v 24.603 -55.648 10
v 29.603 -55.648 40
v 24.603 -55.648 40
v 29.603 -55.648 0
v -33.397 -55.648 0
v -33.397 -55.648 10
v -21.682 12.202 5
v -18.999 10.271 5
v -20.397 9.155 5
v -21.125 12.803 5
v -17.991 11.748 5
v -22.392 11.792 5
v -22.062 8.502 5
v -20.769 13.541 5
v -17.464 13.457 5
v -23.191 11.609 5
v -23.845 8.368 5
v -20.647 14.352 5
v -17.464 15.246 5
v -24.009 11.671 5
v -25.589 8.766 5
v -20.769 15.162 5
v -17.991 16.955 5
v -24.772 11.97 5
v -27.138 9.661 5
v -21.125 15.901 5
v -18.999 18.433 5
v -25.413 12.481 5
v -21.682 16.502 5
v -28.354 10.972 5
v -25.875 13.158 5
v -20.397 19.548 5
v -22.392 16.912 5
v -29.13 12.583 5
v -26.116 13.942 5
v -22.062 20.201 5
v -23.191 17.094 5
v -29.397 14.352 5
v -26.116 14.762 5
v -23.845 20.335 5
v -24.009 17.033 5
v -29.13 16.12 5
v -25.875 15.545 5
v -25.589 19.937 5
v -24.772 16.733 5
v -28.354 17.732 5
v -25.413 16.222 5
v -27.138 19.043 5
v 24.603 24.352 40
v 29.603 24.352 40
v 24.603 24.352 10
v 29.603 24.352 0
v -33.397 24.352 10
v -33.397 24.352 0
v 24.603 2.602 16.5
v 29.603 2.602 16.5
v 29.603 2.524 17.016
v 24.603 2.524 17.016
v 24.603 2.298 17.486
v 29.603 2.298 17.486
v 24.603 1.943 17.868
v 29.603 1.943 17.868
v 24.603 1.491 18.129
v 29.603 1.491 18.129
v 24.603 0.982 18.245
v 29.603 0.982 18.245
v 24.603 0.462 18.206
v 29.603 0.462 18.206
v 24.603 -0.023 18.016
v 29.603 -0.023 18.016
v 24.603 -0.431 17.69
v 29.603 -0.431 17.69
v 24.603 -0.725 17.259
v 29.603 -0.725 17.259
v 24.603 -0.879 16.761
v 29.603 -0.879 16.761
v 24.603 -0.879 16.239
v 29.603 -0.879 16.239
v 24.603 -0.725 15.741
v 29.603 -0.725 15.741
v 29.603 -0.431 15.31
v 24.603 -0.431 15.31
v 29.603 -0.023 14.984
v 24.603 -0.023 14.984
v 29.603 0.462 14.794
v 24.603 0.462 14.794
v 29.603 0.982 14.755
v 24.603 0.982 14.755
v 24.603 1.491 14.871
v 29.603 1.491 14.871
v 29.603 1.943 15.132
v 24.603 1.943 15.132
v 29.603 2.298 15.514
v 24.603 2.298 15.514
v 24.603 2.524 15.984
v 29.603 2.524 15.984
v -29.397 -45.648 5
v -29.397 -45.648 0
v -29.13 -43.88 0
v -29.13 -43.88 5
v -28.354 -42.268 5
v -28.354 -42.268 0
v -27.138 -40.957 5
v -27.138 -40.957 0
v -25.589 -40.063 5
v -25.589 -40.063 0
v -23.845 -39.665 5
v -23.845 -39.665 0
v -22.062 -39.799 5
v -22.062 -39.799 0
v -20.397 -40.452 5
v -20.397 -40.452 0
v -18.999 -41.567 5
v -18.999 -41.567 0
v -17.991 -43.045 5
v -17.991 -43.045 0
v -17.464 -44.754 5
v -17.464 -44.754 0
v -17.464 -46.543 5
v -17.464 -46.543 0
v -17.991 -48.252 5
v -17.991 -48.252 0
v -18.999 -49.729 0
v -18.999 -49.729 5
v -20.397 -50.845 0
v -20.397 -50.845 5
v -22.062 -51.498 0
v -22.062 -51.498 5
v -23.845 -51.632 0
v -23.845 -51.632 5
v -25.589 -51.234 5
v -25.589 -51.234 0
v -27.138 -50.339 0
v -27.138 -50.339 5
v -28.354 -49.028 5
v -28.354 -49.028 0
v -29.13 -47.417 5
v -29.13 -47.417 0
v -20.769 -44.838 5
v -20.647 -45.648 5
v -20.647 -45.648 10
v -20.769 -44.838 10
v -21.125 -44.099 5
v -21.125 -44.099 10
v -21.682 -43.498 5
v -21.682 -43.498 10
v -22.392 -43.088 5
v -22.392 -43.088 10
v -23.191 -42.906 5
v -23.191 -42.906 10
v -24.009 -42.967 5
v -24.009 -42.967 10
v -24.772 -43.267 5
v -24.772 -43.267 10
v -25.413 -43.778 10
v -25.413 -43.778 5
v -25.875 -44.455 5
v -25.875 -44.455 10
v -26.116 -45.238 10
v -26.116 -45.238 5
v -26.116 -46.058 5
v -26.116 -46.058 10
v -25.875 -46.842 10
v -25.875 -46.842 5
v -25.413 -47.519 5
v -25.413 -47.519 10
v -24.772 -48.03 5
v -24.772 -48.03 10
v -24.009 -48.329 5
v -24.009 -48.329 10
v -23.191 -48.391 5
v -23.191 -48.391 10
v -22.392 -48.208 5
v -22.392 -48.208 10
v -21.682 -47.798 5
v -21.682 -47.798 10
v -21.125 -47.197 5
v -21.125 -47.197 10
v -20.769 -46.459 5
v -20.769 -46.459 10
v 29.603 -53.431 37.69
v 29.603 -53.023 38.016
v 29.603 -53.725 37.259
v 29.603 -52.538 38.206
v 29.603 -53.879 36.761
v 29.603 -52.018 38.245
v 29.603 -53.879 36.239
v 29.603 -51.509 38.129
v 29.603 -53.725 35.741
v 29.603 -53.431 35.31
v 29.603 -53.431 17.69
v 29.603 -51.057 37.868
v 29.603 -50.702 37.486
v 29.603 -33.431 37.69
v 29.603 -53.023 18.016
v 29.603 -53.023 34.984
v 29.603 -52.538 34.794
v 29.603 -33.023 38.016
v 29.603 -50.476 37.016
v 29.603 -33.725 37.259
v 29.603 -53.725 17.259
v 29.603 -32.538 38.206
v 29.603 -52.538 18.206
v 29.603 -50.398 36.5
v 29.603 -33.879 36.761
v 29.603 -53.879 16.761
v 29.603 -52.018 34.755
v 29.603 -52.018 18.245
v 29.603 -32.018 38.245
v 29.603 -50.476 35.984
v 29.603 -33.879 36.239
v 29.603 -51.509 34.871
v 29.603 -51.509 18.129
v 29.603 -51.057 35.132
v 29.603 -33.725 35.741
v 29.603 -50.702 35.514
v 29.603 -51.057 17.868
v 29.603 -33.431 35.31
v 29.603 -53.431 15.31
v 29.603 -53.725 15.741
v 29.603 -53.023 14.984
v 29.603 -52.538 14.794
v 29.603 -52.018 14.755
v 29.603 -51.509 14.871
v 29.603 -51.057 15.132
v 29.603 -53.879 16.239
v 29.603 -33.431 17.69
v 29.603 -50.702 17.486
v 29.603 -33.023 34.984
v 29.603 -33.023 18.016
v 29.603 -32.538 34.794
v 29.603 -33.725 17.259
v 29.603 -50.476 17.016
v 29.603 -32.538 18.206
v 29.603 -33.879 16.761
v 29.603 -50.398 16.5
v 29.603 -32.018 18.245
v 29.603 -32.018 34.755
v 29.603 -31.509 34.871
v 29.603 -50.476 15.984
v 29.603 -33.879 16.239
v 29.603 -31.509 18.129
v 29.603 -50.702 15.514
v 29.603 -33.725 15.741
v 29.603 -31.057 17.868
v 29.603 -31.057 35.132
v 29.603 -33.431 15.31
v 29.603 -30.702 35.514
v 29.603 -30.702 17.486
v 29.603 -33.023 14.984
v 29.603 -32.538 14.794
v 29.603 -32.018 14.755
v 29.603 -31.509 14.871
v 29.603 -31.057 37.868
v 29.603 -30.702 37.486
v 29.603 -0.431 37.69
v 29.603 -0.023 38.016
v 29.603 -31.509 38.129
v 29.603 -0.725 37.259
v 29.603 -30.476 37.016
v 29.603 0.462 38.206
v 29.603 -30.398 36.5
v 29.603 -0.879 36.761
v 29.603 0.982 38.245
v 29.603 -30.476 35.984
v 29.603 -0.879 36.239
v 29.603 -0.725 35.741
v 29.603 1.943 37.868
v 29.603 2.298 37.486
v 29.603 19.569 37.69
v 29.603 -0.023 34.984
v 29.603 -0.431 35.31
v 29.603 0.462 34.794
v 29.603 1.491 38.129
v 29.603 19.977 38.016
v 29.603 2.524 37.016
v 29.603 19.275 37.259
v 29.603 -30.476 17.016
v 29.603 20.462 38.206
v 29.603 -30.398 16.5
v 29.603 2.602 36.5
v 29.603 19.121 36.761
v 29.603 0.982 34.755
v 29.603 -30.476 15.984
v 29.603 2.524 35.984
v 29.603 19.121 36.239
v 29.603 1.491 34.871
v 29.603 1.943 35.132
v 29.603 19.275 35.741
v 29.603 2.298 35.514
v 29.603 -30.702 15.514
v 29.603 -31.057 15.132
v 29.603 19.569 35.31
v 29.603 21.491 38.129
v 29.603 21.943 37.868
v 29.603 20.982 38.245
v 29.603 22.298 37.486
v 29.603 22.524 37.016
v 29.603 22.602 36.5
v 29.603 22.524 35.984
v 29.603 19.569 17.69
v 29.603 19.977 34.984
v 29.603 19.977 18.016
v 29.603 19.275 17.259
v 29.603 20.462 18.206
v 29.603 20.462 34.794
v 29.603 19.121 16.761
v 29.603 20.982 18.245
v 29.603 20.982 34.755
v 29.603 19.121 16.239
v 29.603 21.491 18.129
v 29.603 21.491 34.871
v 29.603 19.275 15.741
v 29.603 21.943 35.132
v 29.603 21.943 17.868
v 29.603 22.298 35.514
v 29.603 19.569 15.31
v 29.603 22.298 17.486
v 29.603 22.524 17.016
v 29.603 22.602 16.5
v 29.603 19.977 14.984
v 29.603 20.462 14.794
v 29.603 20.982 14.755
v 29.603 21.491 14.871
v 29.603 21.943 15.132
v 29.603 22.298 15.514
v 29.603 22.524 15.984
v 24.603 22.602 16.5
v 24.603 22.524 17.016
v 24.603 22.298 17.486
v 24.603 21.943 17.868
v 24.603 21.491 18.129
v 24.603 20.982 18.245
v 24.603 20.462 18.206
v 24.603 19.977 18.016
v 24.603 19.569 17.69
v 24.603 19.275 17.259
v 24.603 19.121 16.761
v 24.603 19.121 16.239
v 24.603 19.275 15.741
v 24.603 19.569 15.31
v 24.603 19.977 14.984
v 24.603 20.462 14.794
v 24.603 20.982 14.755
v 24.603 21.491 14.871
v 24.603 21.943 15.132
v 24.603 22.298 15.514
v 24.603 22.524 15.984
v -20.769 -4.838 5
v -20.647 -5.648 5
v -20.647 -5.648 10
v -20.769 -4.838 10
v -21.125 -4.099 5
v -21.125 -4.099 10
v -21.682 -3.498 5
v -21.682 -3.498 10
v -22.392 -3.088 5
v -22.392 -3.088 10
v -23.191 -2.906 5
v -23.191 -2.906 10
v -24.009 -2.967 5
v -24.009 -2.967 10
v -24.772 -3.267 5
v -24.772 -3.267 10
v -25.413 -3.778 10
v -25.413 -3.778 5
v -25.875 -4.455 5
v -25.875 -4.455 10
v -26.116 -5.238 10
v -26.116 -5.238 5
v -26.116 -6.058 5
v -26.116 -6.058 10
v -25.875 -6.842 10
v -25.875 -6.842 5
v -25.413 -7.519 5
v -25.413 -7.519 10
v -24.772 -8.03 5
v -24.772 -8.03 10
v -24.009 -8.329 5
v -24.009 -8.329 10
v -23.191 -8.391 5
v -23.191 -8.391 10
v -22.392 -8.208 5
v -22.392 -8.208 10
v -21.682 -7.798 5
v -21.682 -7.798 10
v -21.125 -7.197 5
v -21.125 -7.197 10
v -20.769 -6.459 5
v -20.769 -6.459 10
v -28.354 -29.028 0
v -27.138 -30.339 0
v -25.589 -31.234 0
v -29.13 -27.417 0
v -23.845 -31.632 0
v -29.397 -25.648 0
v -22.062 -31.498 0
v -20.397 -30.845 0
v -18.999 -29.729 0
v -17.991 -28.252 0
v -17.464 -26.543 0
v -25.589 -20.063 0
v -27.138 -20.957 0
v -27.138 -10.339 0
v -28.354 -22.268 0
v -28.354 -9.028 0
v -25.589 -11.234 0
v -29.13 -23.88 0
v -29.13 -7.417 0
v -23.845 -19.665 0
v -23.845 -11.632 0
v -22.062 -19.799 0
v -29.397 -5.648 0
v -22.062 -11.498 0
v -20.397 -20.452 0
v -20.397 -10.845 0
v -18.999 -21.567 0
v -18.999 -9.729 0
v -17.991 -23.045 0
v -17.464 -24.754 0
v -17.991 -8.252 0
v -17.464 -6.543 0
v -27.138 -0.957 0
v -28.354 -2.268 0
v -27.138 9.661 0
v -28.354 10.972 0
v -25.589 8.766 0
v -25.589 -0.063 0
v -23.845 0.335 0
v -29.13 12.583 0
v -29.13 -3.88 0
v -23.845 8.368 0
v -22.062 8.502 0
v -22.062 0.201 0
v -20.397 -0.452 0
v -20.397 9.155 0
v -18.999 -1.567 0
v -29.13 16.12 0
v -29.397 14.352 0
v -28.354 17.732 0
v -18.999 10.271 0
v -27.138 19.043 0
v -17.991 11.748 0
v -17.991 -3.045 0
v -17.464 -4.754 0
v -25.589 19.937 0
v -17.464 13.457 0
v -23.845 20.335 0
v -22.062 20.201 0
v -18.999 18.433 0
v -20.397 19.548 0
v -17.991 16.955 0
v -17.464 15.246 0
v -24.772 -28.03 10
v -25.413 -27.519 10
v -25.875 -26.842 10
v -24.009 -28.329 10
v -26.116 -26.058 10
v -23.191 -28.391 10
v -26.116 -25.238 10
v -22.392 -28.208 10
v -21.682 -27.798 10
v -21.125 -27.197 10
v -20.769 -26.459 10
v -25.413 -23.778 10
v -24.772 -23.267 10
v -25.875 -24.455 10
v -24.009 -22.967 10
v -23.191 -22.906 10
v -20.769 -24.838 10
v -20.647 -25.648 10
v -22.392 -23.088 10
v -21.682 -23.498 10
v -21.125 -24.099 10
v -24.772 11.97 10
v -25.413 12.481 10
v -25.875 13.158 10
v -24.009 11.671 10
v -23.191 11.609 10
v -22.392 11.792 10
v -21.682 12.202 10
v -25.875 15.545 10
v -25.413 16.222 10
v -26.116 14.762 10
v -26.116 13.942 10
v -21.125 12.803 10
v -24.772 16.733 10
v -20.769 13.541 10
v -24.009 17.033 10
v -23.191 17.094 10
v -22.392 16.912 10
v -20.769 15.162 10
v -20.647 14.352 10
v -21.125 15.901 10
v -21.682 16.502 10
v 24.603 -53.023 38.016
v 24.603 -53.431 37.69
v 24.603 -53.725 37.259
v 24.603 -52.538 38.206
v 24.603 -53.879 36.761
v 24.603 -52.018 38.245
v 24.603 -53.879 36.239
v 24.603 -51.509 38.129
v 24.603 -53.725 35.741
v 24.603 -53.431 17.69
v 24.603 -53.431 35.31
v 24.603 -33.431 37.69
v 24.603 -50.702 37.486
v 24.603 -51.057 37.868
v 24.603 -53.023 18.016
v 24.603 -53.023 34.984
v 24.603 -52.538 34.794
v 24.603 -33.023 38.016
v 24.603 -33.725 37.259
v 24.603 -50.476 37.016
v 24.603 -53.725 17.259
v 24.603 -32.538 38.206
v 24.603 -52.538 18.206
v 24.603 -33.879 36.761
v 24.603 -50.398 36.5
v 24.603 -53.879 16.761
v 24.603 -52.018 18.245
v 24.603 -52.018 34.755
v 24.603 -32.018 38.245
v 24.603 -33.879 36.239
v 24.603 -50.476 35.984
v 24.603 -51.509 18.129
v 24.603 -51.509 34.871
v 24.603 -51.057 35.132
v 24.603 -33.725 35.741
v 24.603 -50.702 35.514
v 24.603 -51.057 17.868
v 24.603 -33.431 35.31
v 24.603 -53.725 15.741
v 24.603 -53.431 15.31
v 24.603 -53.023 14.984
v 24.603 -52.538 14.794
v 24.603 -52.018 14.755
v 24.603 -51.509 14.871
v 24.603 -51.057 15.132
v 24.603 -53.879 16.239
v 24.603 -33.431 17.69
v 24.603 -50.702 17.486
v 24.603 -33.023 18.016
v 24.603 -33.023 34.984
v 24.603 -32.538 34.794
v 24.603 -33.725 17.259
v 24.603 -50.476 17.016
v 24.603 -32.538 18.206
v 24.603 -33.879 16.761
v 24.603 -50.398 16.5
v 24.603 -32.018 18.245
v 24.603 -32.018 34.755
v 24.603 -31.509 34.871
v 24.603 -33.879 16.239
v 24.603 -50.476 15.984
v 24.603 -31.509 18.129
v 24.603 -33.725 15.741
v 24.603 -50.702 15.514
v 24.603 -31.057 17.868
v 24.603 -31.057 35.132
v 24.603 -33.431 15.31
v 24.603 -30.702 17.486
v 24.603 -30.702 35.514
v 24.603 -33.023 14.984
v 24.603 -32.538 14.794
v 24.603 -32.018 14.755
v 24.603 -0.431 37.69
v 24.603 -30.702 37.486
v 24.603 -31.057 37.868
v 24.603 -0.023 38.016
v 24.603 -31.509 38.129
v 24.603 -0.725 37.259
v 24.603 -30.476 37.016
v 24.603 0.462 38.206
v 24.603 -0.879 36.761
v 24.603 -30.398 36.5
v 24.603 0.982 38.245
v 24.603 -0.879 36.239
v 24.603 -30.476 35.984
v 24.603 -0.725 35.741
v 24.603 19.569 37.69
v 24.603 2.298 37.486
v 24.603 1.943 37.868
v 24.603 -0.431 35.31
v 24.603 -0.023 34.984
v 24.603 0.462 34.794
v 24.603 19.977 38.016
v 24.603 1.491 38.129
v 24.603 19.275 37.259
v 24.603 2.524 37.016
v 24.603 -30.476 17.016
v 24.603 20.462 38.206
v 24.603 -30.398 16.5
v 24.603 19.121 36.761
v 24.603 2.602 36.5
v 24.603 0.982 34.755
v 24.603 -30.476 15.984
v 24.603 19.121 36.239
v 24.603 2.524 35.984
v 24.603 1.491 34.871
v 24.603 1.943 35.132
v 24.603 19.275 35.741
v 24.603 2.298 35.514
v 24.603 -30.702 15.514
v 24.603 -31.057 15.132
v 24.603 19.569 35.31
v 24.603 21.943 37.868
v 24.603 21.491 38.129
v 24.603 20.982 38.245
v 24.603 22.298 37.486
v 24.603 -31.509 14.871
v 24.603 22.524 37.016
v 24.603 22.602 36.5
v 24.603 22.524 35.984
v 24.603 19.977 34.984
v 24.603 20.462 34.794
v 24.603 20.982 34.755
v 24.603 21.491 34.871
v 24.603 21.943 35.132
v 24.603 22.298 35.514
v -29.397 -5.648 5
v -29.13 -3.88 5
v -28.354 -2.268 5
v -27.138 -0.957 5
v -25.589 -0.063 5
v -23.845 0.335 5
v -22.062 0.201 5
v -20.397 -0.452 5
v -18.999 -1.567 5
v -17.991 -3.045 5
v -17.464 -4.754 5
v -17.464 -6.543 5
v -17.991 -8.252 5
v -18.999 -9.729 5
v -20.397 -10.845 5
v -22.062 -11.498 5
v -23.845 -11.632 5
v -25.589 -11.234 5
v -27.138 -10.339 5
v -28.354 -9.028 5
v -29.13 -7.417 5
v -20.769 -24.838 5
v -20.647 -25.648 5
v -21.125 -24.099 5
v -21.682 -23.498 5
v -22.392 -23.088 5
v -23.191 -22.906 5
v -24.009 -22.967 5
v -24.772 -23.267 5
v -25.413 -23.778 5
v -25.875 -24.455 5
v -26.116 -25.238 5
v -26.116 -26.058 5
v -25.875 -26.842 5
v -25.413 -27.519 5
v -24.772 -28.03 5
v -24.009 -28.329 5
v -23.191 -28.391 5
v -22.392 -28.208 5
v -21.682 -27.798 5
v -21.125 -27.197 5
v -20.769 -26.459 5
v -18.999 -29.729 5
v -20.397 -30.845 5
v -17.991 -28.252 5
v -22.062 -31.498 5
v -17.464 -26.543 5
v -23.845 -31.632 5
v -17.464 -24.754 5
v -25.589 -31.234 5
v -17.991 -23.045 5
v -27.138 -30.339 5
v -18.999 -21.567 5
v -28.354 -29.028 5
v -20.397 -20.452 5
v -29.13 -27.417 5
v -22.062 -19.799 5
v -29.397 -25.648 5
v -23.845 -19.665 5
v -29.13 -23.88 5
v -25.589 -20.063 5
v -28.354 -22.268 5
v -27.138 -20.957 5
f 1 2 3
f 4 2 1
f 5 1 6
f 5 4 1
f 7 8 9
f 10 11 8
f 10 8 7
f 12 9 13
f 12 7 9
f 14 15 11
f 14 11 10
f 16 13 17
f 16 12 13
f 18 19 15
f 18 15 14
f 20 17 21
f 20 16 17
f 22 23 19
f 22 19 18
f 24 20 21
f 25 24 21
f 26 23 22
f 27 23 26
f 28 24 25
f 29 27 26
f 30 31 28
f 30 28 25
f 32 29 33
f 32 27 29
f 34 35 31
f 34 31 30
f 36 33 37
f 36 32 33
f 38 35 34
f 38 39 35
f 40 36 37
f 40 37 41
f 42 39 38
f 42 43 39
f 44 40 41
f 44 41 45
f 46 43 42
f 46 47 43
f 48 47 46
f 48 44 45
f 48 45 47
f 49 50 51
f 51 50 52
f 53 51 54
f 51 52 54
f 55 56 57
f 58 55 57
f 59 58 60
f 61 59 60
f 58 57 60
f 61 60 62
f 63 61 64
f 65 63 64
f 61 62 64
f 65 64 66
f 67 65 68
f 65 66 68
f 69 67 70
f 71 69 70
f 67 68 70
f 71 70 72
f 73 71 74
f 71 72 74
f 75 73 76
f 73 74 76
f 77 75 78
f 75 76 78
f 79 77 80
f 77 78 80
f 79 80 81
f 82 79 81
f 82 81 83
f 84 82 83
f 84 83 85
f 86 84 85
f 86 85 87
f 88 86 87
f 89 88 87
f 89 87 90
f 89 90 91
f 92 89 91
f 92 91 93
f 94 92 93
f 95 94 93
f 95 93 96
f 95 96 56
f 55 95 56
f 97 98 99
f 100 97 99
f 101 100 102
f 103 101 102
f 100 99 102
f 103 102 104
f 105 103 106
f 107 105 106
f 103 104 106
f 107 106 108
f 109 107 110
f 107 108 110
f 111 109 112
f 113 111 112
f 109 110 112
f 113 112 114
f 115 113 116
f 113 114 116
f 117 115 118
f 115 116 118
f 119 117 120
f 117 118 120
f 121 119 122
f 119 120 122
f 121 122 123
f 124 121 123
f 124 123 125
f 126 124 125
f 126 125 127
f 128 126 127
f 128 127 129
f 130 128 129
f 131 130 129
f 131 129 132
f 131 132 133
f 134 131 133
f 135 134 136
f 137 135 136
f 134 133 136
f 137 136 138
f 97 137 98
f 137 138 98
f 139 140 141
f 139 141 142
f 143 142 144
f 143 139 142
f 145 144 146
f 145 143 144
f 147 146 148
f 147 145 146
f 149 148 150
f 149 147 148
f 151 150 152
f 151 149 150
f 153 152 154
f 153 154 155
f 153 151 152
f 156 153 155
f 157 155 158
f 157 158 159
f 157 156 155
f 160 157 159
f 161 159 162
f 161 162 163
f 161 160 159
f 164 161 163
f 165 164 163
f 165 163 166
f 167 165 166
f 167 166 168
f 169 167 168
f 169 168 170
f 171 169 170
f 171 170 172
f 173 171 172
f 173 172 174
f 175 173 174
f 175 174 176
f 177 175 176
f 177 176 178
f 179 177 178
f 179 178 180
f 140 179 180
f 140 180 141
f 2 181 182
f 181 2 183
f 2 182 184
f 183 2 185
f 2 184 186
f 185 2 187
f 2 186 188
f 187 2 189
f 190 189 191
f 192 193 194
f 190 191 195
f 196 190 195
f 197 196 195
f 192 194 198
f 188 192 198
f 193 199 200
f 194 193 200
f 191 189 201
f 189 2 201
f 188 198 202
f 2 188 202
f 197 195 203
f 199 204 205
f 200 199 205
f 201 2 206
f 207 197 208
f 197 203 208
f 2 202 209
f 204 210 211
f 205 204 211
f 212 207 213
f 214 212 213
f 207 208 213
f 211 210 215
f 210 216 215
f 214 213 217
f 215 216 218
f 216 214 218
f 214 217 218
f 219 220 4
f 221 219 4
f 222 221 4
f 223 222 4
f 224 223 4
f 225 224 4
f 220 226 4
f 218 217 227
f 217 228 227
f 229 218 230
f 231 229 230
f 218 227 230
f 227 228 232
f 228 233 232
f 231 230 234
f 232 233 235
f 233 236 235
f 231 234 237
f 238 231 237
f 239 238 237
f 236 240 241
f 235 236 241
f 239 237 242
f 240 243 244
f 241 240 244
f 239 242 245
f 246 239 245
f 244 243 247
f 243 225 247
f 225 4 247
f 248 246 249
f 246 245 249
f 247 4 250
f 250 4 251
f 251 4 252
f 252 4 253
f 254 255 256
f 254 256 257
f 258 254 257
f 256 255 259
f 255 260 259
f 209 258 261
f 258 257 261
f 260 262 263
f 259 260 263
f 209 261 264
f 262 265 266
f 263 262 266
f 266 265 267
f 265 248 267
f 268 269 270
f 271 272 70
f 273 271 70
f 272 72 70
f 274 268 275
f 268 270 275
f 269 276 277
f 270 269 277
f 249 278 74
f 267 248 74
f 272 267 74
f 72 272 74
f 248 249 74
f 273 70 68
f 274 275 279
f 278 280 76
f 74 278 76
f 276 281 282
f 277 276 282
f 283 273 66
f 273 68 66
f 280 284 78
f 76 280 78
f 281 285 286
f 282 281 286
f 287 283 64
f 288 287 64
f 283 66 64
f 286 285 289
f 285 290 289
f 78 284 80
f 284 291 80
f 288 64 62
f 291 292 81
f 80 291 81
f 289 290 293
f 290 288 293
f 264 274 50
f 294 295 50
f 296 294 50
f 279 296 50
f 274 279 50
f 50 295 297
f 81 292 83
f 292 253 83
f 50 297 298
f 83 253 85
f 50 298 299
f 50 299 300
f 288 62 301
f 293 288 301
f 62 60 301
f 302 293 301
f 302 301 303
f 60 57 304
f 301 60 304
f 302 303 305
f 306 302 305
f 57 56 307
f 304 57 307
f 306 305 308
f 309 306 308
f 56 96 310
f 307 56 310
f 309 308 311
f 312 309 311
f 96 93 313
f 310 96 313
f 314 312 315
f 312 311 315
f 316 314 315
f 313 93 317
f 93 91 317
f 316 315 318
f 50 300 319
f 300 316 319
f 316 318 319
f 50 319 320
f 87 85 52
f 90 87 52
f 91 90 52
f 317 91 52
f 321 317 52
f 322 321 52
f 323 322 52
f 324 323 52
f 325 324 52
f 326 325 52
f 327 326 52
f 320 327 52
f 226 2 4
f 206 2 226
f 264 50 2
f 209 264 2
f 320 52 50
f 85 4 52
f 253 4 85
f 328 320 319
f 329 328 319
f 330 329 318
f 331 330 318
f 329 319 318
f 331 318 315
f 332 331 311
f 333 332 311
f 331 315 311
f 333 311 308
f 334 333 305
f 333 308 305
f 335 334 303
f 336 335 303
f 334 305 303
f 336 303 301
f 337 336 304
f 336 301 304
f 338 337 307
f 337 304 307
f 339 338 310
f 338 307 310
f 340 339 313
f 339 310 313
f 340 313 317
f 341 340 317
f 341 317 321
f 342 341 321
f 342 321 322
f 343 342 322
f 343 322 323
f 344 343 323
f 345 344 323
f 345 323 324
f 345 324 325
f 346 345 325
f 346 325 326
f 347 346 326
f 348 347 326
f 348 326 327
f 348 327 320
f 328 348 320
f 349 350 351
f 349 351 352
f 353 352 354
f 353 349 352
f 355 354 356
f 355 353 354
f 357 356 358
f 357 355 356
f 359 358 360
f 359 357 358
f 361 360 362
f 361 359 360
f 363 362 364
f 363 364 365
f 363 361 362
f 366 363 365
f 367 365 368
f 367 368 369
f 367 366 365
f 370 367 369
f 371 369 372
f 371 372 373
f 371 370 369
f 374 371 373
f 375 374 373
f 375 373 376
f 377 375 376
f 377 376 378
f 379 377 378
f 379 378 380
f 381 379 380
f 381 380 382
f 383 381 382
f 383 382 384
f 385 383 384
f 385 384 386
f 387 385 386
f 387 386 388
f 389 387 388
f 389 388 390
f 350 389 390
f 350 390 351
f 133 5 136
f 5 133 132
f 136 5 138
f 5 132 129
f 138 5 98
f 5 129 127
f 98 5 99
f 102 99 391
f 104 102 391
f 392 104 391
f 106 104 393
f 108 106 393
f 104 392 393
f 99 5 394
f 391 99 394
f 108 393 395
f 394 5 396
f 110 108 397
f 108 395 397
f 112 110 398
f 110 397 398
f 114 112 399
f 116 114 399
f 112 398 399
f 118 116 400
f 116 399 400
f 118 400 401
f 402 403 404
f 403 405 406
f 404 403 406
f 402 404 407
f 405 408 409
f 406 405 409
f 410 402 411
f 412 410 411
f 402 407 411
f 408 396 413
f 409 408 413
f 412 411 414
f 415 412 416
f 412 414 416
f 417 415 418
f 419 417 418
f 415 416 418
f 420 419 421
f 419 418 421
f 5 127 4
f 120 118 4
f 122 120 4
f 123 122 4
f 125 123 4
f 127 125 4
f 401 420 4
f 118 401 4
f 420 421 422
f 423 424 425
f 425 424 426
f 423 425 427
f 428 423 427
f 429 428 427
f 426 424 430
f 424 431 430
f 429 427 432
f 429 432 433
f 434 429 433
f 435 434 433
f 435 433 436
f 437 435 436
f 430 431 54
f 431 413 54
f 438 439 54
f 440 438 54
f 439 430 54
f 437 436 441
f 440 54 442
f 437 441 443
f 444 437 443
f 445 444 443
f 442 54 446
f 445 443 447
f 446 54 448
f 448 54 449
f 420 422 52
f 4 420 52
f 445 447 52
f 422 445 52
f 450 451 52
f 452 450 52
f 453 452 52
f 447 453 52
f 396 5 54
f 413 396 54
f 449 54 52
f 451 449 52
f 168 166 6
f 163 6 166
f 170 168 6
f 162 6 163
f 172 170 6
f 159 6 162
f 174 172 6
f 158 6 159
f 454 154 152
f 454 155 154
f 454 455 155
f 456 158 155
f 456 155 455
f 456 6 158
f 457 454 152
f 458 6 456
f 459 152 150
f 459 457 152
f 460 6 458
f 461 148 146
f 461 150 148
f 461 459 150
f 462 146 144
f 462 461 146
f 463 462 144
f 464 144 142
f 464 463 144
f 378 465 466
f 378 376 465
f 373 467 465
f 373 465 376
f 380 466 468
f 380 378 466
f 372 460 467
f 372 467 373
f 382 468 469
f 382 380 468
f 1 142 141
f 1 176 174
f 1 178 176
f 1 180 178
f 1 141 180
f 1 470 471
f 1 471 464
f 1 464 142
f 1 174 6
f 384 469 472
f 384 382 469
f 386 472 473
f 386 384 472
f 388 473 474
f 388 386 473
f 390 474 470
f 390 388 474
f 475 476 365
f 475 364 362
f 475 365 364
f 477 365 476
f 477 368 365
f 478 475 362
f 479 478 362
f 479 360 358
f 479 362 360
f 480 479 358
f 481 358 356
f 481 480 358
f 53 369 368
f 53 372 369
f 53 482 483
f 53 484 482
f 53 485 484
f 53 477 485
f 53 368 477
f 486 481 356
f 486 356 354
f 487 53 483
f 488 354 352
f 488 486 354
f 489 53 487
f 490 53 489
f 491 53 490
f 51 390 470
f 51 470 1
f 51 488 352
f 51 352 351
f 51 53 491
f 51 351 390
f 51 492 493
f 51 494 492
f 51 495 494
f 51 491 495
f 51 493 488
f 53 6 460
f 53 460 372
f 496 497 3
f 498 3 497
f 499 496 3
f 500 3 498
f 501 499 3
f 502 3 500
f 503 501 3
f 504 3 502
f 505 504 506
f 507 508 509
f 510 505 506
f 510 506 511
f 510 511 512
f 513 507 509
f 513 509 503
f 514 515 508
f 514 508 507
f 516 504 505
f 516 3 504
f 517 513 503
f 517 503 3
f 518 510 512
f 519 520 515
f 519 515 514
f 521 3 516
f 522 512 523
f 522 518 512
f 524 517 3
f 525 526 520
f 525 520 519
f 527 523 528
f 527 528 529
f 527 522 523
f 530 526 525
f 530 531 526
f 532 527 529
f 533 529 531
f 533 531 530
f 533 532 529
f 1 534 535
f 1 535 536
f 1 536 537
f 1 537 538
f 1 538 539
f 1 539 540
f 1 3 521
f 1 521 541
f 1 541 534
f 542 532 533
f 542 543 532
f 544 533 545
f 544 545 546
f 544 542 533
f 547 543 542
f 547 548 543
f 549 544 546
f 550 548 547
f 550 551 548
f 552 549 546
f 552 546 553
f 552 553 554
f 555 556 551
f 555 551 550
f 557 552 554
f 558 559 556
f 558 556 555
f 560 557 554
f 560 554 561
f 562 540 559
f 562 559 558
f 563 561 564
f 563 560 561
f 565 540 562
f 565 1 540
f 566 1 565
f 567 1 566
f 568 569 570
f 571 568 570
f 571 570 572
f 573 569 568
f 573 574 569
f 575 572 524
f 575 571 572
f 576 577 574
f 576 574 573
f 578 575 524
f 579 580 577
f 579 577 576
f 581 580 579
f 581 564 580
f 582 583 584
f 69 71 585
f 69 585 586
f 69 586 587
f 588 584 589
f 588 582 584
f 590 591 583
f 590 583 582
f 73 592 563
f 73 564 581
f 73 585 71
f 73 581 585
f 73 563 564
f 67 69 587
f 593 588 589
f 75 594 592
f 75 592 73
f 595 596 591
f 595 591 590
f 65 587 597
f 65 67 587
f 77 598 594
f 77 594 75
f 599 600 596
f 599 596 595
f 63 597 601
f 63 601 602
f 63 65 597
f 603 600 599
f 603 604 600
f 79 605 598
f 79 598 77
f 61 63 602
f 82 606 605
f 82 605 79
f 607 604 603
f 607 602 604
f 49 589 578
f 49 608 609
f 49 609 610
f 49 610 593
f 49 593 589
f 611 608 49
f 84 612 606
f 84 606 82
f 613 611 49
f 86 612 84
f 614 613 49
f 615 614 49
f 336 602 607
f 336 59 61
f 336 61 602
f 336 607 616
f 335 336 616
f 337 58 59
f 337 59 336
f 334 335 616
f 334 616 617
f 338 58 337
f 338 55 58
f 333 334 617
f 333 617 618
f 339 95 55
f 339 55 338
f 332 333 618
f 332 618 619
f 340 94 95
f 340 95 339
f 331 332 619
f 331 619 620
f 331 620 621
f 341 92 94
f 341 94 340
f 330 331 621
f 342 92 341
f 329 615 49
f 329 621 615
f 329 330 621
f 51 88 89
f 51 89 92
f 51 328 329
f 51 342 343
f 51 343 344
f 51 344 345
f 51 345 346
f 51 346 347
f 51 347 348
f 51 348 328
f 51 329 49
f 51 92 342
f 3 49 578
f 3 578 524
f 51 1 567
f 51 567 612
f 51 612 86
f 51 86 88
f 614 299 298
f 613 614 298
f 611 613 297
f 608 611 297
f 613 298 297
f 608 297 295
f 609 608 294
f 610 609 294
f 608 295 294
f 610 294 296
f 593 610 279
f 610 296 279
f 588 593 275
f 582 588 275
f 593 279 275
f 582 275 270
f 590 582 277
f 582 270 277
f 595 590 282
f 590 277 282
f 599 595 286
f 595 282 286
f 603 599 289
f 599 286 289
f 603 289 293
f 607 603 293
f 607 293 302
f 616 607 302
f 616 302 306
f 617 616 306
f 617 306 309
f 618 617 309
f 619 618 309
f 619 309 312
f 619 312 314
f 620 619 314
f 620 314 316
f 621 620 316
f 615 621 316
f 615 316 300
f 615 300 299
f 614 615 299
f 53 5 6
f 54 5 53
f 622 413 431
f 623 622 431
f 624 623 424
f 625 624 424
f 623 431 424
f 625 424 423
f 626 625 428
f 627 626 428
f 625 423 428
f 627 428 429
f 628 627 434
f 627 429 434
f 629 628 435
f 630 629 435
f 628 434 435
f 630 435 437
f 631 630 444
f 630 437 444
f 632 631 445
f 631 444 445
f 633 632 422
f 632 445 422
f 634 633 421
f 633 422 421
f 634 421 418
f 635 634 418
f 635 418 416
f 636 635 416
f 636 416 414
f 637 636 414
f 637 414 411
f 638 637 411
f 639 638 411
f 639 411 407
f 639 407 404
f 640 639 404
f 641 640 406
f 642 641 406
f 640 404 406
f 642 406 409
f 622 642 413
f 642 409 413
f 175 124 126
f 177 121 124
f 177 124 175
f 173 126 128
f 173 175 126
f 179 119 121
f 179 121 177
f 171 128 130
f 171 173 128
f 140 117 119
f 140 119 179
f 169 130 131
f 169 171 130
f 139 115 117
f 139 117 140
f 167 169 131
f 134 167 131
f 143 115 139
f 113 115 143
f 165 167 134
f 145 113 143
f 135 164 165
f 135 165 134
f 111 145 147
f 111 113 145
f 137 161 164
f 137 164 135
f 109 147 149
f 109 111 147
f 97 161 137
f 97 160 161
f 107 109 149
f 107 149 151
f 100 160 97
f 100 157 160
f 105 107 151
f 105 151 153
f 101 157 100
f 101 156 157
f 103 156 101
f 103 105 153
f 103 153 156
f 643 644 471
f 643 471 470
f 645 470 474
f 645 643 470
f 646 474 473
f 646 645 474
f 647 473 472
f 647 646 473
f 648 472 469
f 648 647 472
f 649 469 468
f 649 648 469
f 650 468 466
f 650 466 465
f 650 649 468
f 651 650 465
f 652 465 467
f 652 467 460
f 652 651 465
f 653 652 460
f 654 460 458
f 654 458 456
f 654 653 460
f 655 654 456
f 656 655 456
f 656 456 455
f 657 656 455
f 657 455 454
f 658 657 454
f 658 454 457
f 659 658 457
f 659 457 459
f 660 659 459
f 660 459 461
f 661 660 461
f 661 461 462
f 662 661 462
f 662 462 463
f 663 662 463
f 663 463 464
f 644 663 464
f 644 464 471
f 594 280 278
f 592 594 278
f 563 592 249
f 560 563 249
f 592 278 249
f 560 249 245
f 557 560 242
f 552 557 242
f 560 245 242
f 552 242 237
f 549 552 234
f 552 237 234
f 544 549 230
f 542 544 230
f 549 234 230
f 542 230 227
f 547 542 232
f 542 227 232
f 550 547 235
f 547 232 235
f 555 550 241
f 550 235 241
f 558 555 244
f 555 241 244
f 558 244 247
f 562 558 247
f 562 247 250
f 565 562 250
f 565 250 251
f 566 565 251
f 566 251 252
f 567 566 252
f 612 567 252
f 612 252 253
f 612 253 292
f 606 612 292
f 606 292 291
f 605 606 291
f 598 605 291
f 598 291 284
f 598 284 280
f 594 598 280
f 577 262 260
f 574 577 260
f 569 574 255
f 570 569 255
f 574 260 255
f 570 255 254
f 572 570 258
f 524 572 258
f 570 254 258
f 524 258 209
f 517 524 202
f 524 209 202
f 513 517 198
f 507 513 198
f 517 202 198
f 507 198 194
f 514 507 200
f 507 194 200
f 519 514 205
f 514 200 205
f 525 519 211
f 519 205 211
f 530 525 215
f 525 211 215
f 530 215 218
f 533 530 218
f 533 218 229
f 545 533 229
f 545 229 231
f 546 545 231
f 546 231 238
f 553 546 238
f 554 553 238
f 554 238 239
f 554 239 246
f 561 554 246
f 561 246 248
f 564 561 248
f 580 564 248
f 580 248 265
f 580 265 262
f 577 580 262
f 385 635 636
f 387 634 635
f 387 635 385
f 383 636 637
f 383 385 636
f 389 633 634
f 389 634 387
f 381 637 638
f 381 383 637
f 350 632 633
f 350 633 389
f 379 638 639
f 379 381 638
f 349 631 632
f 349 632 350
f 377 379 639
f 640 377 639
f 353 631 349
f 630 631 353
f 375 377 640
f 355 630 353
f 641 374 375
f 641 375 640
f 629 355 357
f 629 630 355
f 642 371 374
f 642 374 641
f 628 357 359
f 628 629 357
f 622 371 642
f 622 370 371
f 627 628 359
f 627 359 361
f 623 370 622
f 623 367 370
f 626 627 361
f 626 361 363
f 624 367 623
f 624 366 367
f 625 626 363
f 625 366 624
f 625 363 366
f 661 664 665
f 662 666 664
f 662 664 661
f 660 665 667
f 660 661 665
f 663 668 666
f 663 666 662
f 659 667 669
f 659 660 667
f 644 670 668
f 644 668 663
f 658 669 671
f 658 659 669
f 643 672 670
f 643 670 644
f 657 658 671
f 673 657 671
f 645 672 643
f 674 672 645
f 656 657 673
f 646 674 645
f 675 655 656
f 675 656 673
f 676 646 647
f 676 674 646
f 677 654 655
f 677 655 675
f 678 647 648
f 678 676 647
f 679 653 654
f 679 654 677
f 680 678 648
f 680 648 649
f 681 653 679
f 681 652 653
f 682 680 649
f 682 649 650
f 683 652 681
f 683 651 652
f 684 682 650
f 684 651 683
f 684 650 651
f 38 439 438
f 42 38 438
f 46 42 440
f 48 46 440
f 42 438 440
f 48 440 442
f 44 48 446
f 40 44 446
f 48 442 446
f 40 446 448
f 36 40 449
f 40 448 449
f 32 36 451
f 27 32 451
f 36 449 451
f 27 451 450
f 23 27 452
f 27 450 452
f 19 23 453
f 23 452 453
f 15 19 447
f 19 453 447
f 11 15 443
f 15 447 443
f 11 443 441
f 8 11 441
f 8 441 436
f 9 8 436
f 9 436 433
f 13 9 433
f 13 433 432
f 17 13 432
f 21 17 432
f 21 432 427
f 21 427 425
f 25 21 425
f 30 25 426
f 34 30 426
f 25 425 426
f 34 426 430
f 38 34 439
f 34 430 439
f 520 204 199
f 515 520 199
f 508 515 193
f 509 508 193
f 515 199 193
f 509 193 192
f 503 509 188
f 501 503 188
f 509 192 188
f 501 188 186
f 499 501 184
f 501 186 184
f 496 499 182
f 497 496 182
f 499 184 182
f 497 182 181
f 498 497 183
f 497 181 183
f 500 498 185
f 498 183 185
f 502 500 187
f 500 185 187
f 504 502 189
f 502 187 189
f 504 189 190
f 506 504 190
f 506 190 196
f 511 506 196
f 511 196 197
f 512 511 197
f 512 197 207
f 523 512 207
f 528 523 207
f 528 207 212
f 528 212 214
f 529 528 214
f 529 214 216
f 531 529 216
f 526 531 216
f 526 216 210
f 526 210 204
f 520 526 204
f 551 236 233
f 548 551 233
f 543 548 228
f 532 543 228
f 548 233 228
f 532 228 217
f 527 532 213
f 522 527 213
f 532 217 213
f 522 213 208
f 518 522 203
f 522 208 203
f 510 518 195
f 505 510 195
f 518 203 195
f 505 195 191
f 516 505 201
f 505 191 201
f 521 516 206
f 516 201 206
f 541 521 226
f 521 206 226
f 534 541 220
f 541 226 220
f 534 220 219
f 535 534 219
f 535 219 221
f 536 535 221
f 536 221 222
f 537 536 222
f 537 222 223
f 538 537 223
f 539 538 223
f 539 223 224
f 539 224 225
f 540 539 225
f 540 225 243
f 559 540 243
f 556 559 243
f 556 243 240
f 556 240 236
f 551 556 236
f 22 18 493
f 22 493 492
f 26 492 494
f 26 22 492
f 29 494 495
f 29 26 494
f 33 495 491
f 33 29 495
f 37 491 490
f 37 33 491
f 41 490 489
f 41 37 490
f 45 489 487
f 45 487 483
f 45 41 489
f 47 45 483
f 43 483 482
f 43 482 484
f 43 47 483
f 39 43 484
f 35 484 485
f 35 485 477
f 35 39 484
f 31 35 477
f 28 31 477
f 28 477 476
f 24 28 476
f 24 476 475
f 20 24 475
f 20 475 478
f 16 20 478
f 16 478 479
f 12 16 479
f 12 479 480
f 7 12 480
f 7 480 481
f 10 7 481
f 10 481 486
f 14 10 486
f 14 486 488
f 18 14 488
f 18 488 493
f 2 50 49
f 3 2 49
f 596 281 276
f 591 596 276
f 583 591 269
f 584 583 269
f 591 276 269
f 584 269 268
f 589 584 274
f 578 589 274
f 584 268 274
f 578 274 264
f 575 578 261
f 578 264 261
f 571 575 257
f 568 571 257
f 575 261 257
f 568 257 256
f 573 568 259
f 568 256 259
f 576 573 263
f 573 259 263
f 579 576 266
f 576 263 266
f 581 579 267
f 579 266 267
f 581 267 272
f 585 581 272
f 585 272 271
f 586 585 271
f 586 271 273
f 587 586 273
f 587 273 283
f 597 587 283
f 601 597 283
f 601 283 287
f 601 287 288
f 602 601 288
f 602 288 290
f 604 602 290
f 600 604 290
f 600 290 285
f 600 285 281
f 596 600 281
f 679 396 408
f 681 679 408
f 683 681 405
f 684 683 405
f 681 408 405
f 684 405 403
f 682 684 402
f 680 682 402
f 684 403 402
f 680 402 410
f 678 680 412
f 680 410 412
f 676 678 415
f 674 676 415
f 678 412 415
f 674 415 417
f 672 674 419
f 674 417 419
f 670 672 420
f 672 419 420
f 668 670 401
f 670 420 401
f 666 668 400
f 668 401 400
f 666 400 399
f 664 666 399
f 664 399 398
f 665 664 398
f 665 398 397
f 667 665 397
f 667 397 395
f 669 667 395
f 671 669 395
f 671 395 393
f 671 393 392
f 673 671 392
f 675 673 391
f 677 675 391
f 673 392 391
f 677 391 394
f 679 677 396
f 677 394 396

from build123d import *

# Parameters (mm, degrees)
ESQUISSE1_W             = 63
ESQUISSE1_H             = 80
ESQUISSE1_R             = 2.75
BOSS_EXTRU_1_DEPTH      = 10
ESQUISSE2_W             = 5
ESQUISSE2_H             = 80
BOSS_EXTRU_2_DEPTH      = 30
ENL_V_MAT_EXTRU_1_REACH = 95.09
ESQUISSE3_R             = 1.75
ESQUISSE4_R             = 6
ENL_V_MAT_EXTRU_2_DEPTH = 5


with BuildPart() as part:
    # Esquisse1 → Boss.-Extru.1 (new body)
    with BuildSketch(Plane.XY):
        with Locations((-1.896872358, -15.648351648)):
            Rectangle(ESQUISSE1_W, ESQUISSE1_H)
        with Locations((-23.396872358, 14.351648352)):
            Circle(ESQUISSE1_R, mode=Mode.SUBTRACT)
        with Locations((-23.396872358, -5.648351648)):
            Circle(ESQUISSE1_R, mode=Mode.SUBTRACT)
        with Locations((-23.396872358, -25.648351648)):
            Circle(ESQUISSE1_R, mode=Mode.SUBTRACT)
        with Locations((-23.396872358, -45.648351648)):
            Circle(ESQUISSE1_R, mode=Mode.SUBTRACT)
    extrude(amount=BOSS_EXTRU_1_DEPTH)

    # Esquisse2 → Boss.-Extru.2 (add)
    with BuildSketch(Plane(origin=(0, 0, 10), x_dir=(-1, 0, 0), z_dir=(0, 0, -1))):
        with Locations((-27.103127642, -15.648351648)):
            Rectangle(ESQUISSE2_W, ESQUISSE2_H)
    extrude(amount=-BOSS_EXTRU_2_DEPTH)

    # Esquisse3 → Enlèv. mat.-Extru.1 (cut, up to next)
    with BuildSketch(Plane(origin=(29.603127642, 0, 0), x_dir=(0, 0, -1), z_dir=(1, 0, 0)), mode=Mode.PRIVATE) as enl_v_mat_extru_1_sk1:
        with Locations(Location((-36.5, -52.148351648, 0), (0, 0, 90))):
            Circle(ESQUISSE3_R)
    enl_v_mat_extru_1_tool1 = extrude(enl_v_mat_extru_1_sk1.sketch, amount=-ENL_V_MAT_EXTRU_1_REACH, mode=Mode.PRIVATE) & part.part
    # Esquisse3 → Enlèv. mat.-Extru.1 (cut, up to next)
    with BuildSketch(Plane(origin=(29.603127642, 0, 0), x_dir=(0, 0, -1), z_dir=(1, 0, 0)), mode=Mode.PRIVATE) as enl_v_mat_extru_1_sk2:
        with Locations(Location((-36.5, -32.148351648, 0), (0, 0, 90))):
            Circle(ESQUISSE3_R)
    enl_v_mat_extru_1_tool2 = extrude(enl_v_mat_extru_1_sk2.sketch, amount=-ENL_V_MAT_EXTRU_1_REACH, mode=Mode.PRIVATE) & part.part
    # Esquisse3 → Enlèv. mat.-Extru.1 (cut, up to next)
    with BuildSketch(Plane(origin=(29.603127642, 0, 0), x_dir=(0, 0, -1), z_dir=(1, 0, 0)), mode=Mode.PRIVATE) as enl_v_mat_extru_1_sk3:
        with Locations(Location((-16.5, -32.148351648, 0), (0, 0, 90))):
            Circle(ESQUISSE3_R)
    enl_v_mat_extru_1_tool3 = extrude(enl_v_mat_extru_1_sk3.sketch, amount=-ENL_V_MAT_EXTRU_1_REACH, mode=Mode.PRIVATE) & part.part
    # Esquisse3 → Enlèv. mat.-Extru.1 (cut, up to next)
    with BuildSketch(Plane(origin=(29.603127642, 0, 0), x_dir=(0, 0, -1), z_dir=(1, 0, 0)), mode=Mode.PRIVATE) as enl_v_mat_extru_1_sk4:
        with Locations(Location((-16.5, -52.148351648, 0), (0, 0, 90))):
            Circle(ESQUISSE3_R)
    enl_v_mat_extru_1_tool4 = extrude(enl_v_mat_extru_1_sk4.sketch, amount=-ENL_V_MAT_EXTRU_1_REACH, mode=Mode.PRIVATE) & part.part
    # Esquisse3 → Enlèv. mat.-Extru.1 (cut, up to next)
    with BuildSketch(Plane(origin=(29.603127642, 0, 0), x_dir=(0, 0, -1), z_dir=(1, 0, 0)), mode=Mode.PRIVATE) as enl_v_mat_extru_1_sk5:
        with Locations(Location((-36.5, 0.851648352, 0), (0, 0, 90))):
            Circle(ESQUISSE3_R)
    enl_v_mat_extru_1_tool5 = extrude(enl_v_mat_extru_1_sk5.sketch, amount=-ENL_V_MAT_EXTRU_1_REACH, mode=Mode.PRIVATE) & part.part
    # Esquisse3 → Enlèv. mat.-Extru.1 (cut, up to next)
    with BuildSketch(Plane(origin=(29.603127642, 0, 0), x_dir=(0, 0, -1), z_dir=(1, 0, 0)), mode=Mode.PRIVATE) as enl_v_mat_extru_1_sk6:
        with Locations(Location((-36.5, 20.851648352, 0), (0, 0, 90))):
            Circle(ESQUISSE3_R)
    enl_v_mat_extru_1_tool6 = extrude(enl_v_mat_extru_1_sk6.sketch, amount=-ENL_V_MAT_EXTRU_1_REACH, mode=Mode.PRIVATE) & part.part
    # Esquisse3 → Enlèv. mat.-Extru.1 (cut, up to next)
    with BuildSketch(Plane(origin=(29.603127642, 0, 0), x_dir=(0, 0, -1), z_dir=(1, 0, 0)), mode=Mode.PRIVATE) as enl_v_mat_extru_1_sk7:
        with Locations(Location((-16.5, 20.851648352, 0), (0, 0, 90))):
            Circle(ESQUISSE3_R)
    enl_v_mat_extru_1_tool7 = extrude(enl_v_mat_extru_1_sk7.sketch, amount=-ENL_V_MAT_EXTRU_1_REACH, mode=Mode.PRIVATE) & part.part
    # Esquisse3 → Enlèv. mat.-Extru.1 (cut, up to next)
    with BuildSketch(Plane(origin=(29.603127642, 0, 0), x_dir=(0, 0, -1), z_dir=(1, 0, 0)), mode=Mode.PRIVATE) as enl_v_mat_extru_1_sk8:
        with Locations(Location((-16.5, 0.851648352, 0), (0, 0, 90))):
            Circle(ESQUISSE3_R)
    enl_v_mat_extru_1_tool8 = extrude(enl_v_mat_extru_1_sk8.sketch, amount=-ENL_V_MAT_EXTRU_1_REACH, mode=Mode.PRIVATE) & part.part
    add(enl_v_mat_extru_1_tool1.solids().sort_by_distance((29.603128, -52.148352, 36.5))[0], mode=Mode.SUBTRACT)
    add(enl_v_mat_extru_1_tool2.solids().sort_by_distance((29.603128, -32.148352, 36.5))[0], mode=Mode.SUBTRACT)
    add(enl_v_mat_extru_1_tool3.solids().sort_by_distance((29.603128, -32.148352, 16.5))[0], mode=Mode.SUBTRACT)
    add(enl_v_mat_extru_1_tool4.solids().sort_by_distance((29.603128, -52.148352, 16.5))[0], mode=Mode.SUBTRACT)
    add(enl_v_mat_extru_1_tool5.solids().sort_by_distance((29.603128, 0.851648, 36.5))[0], mode=Mode.SUBTRACT)
    add(enl_v_mat_extru_1_tool6.solids().sort_by_distance((29.603128, 20.851648, 36.5))[0], mode=Mode.SUBTRACT)
    add(enl_v_mat_extru_1_tool7.solids().sort_by_distance((29.603128, 20.851648, 16.5))[0], mode=Mode.SUBTRACT)
    add(enl_v_mat_extru_1_tool8.solids().sort_by_distance((29.603128, 0.851648, 16.5))[0], mode=Mode.SUBTRACT)

    # Esquisse4 → Enlèv. mat.-Extru.2 (cut)
    with BuildSketch(Plane(origin=(0, 0, 0), x_dir=(-1, 0, 0), z_dir=(0, 0, -1))):
        with Locations((23.396872358, -45.648351648)):
            Circle(ESQUISSE4_R)
        with Locations((23.396872358, -25.648351648)):
            Circle(ESQUISSE4_R)
        with Locations((23.396872358, -5.648351648)):
            Circle(ESQUISSE4_R)
        with Locations((23.396872358, 14.351648352)):
            Circle(ESQUISSE4_R)
    extrude(amount=-ENL_V_MAT_EXTRU_2_DEPTH, mode=Mode.SUBTRACT)


solid = part.part
